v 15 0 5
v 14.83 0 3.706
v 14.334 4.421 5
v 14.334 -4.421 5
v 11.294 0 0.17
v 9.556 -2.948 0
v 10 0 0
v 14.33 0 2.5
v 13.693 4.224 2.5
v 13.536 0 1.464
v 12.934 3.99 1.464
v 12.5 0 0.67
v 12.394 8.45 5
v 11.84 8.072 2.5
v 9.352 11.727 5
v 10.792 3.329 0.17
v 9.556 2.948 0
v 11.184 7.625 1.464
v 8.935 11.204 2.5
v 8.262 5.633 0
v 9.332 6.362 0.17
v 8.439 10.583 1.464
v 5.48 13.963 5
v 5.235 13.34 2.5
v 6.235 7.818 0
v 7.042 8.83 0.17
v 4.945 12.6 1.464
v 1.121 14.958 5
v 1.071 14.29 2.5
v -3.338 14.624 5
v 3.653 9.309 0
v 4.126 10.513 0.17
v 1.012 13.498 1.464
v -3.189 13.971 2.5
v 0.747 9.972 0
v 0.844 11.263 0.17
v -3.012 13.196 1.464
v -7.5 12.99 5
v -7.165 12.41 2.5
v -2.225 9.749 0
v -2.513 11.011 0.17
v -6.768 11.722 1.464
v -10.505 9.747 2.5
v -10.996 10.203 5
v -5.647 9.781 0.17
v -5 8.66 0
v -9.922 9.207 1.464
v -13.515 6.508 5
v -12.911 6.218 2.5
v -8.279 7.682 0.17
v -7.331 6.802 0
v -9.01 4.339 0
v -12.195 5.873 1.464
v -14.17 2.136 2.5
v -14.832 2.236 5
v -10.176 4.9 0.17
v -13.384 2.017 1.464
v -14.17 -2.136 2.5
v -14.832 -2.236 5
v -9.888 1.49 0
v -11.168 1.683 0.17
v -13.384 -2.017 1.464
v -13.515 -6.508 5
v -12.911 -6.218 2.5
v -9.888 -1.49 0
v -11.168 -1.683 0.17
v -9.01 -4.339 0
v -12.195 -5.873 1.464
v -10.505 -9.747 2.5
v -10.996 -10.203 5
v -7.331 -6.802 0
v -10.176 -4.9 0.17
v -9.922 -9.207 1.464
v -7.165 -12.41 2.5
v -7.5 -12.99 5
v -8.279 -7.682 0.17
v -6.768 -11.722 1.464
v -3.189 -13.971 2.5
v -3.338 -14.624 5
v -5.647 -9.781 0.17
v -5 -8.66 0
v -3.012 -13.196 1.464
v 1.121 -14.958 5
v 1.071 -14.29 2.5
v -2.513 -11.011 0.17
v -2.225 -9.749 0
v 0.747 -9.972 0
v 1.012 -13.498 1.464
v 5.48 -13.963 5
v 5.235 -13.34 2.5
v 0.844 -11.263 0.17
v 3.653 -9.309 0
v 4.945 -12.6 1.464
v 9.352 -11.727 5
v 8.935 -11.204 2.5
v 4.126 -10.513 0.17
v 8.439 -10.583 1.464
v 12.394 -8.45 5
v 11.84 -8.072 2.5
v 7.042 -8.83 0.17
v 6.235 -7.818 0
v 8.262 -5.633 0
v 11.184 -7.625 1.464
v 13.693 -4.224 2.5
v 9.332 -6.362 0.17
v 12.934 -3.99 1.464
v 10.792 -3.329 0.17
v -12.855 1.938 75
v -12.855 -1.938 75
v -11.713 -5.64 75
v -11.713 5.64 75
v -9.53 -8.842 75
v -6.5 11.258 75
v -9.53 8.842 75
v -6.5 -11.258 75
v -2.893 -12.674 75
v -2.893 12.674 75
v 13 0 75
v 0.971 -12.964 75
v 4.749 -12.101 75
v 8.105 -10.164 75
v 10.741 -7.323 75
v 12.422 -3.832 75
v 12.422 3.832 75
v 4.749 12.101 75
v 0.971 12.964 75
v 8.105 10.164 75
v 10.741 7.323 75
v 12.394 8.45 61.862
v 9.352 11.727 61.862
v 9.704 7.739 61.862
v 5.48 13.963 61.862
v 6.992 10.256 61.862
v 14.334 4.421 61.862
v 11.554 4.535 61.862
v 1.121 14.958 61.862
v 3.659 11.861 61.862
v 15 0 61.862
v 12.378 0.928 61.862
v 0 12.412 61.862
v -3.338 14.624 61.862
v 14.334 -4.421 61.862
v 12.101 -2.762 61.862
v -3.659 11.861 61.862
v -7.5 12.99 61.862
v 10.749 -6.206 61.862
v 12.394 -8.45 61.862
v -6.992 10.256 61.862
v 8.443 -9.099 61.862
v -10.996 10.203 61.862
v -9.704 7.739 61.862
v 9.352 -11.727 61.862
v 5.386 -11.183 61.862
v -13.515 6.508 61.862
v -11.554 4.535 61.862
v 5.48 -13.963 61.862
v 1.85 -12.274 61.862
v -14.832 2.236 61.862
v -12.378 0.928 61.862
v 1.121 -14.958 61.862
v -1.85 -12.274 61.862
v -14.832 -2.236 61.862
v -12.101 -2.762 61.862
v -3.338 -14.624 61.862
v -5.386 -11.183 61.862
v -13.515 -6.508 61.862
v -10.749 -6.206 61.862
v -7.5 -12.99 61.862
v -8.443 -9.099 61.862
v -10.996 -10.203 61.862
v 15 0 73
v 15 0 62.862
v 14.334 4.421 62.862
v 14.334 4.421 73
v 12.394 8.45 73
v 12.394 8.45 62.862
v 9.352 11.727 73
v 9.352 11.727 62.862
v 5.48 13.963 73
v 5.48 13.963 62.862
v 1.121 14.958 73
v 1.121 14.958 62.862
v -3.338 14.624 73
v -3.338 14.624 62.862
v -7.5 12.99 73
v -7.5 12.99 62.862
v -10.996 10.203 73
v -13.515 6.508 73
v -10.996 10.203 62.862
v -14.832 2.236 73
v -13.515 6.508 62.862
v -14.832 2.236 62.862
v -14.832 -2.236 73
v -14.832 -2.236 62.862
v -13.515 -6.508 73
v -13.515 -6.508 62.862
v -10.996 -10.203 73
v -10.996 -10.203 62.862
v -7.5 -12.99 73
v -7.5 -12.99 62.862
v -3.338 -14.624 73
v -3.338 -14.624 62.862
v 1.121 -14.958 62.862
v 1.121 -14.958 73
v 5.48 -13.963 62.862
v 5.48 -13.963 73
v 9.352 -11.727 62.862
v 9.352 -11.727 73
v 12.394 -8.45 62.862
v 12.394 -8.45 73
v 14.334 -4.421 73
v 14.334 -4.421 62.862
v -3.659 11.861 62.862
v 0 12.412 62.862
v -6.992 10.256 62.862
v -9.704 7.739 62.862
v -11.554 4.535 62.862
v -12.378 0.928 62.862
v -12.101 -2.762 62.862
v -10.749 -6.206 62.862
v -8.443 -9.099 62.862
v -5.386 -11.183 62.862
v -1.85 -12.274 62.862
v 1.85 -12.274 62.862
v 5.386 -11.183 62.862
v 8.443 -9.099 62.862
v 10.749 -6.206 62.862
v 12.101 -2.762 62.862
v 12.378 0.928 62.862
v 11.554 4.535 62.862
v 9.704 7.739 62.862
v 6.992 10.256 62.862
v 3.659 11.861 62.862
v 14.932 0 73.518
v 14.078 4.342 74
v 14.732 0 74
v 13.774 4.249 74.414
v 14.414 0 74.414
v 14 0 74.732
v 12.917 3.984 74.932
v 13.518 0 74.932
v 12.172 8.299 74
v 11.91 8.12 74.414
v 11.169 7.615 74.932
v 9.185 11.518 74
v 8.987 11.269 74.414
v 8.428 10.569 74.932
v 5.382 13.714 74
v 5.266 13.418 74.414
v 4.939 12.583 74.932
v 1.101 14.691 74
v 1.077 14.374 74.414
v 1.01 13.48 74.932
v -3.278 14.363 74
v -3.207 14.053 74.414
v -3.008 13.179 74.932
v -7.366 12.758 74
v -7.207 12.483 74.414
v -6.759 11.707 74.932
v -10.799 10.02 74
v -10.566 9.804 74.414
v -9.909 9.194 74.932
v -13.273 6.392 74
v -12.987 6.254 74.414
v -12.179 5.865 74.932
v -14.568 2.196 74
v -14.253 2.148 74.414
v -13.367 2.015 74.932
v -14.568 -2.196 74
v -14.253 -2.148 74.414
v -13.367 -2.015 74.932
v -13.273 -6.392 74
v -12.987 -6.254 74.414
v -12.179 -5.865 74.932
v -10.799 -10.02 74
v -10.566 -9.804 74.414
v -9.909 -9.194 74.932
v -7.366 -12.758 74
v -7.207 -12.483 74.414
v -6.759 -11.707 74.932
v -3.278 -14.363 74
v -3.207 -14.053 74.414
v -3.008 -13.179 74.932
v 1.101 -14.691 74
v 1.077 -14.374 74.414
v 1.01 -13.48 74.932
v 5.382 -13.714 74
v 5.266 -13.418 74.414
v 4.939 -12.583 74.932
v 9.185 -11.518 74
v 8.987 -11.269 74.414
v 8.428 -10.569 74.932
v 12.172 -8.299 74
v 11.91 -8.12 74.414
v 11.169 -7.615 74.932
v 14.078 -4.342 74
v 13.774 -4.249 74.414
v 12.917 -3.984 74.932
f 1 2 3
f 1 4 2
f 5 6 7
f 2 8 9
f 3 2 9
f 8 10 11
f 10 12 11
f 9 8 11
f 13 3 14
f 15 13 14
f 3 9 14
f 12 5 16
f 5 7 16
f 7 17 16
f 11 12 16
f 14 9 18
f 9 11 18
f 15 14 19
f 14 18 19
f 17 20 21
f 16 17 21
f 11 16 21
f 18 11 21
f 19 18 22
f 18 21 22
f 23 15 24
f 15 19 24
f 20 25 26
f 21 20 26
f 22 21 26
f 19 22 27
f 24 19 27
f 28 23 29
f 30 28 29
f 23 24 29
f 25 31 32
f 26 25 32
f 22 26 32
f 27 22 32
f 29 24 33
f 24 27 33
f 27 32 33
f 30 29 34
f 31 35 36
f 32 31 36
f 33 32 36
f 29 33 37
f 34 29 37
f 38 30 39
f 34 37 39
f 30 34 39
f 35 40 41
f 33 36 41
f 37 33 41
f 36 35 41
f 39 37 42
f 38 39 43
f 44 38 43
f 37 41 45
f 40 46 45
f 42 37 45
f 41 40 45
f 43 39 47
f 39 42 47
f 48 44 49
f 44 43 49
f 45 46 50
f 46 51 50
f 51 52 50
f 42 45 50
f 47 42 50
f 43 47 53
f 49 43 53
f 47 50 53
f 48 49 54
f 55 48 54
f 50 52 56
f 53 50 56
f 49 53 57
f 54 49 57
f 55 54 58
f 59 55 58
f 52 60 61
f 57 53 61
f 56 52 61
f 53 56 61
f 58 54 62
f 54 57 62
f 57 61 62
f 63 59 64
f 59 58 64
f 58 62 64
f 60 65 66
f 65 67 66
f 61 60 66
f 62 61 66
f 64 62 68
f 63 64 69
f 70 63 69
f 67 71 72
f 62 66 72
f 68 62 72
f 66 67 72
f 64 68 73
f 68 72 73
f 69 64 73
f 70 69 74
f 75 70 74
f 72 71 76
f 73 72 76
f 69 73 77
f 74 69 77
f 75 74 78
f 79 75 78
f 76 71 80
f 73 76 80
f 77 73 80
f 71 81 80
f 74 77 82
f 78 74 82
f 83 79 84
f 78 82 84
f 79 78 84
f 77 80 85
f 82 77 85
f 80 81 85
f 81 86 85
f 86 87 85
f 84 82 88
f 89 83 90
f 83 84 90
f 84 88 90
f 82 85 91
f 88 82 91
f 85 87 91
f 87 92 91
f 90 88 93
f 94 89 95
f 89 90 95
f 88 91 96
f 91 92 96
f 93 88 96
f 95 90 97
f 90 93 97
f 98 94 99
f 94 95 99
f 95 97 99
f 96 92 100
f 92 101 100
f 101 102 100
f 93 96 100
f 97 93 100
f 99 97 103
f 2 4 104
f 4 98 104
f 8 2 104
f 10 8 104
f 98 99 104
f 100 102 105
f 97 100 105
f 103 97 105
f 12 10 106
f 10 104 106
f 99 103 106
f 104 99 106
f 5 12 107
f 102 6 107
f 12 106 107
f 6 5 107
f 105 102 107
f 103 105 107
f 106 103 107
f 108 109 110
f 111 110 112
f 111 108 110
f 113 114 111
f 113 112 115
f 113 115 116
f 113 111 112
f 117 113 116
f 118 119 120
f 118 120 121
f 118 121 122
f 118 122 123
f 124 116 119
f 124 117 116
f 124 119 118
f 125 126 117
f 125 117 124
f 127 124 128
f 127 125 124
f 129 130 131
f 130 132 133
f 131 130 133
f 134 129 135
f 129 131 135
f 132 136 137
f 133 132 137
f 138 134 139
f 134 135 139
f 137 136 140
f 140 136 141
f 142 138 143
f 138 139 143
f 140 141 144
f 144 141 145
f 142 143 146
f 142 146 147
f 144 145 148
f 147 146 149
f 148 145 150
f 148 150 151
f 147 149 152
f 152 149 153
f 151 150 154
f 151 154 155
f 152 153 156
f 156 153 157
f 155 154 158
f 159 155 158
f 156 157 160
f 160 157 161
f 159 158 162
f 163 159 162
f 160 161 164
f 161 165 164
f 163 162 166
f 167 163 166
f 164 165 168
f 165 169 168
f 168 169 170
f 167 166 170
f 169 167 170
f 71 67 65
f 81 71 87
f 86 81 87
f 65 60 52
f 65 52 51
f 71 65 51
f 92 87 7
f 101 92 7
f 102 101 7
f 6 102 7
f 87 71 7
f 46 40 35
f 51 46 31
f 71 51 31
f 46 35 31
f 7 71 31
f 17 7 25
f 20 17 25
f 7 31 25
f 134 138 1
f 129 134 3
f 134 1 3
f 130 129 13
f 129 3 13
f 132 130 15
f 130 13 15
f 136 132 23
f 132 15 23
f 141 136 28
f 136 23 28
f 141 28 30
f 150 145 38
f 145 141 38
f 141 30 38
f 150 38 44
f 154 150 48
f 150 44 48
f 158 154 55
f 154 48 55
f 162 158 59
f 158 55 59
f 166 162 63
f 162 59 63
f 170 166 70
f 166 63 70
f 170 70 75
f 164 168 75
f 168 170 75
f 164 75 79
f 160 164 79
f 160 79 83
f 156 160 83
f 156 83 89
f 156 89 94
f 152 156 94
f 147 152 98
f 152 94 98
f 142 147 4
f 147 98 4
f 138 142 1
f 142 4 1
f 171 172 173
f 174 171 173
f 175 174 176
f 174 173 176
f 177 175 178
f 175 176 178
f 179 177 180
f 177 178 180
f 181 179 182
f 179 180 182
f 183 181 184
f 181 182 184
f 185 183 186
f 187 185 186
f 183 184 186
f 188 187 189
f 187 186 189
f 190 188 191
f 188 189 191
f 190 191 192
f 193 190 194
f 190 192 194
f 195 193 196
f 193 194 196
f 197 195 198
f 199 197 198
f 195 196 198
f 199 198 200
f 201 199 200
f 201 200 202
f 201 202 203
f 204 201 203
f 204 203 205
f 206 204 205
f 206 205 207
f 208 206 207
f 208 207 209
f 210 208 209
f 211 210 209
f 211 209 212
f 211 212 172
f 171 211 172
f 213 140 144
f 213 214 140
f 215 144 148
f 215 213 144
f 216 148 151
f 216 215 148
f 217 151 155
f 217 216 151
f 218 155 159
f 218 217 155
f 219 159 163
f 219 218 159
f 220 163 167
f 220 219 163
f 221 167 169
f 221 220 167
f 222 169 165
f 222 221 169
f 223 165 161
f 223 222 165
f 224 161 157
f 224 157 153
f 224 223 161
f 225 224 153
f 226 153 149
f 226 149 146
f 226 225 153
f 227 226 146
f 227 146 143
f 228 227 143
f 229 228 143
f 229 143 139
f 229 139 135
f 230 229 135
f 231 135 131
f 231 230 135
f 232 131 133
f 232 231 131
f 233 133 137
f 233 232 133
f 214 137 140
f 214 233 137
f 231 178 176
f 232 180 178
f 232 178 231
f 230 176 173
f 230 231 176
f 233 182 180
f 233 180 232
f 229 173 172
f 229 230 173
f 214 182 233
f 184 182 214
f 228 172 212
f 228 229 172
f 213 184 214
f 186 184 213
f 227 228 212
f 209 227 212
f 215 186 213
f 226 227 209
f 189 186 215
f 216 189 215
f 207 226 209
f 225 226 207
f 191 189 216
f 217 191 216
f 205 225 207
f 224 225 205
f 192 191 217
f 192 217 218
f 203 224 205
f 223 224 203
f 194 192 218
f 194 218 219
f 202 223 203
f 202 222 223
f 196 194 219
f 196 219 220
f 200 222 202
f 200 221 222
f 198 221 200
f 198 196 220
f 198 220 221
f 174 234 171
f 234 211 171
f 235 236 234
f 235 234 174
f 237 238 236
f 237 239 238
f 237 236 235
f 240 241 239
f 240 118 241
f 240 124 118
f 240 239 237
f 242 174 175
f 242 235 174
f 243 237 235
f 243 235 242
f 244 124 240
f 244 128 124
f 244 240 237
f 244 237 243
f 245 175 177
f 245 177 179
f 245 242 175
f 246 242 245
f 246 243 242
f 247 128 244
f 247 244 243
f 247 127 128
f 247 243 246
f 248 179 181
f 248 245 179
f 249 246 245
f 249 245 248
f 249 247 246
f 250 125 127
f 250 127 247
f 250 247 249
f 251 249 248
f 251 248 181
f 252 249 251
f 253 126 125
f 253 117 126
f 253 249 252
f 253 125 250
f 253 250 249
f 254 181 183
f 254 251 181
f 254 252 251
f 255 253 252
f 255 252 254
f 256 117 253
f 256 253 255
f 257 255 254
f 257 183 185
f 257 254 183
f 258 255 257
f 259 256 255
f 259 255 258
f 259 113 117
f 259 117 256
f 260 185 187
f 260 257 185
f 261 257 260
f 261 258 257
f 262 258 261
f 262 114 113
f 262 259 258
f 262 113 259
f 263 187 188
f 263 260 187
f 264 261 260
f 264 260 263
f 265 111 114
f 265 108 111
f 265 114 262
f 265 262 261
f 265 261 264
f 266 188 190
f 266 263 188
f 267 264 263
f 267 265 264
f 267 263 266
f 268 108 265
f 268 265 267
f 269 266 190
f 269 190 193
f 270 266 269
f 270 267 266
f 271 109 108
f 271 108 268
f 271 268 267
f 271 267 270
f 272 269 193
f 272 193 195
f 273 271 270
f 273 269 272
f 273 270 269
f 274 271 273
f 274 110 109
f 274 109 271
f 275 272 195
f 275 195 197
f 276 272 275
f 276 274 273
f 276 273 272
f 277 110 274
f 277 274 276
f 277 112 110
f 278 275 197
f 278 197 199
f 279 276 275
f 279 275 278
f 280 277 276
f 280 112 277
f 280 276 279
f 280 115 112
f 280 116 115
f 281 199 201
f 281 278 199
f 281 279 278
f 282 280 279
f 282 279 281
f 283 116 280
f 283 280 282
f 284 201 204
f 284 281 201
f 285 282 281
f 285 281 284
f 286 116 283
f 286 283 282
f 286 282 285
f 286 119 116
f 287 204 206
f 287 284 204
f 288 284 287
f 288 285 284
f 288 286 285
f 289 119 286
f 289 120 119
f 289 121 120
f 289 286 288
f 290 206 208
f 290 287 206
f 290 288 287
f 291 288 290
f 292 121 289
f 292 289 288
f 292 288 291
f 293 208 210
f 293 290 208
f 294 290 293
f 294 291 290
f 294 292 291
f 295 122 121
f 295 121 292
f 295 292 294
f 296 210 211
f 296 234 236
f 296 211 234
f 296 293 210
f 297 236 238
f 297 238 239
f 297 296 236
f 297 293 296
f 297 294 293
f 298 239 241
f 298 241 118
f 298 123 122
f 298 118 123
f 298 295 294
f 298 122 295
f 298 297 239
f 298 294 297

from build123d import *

# Parameters (mm, degrees)
F0_R     = 15
F1_DEPTH = 75
F2_R     = 5
F3_R     = 2
F4_W     = 6.931401
F4_H     = 1


with BuildPart() as f1:
    # F0 (on Top) → F1 (new body)
    with BuildSketch(Plane.XY):
        Circle(F0_R)
    extrude(amount=F1_DEPTH)

    # F2
    f2_edges = [f1.edges().sort_by_distance(p)[0] for p in [
        (-15, 0, 0),
    ]]
    fillet(f2_edges, radius=F2_R)

    # F3
    f3_edges = [f1.edges().sort_by_distance(p)[0] for p in [
        (-15, 0, 75),
    ]]
    fillet(f3_edges, radius=F3_R)

    # F4 (on Right) → F5 (revolve, cut)
    with BuildSketch(Plane.YZ):
        with Locations((15.878135, 62.361921)):
            Rectangle(F4_W, F4_H)
    revolve(axis=Axis((0, 0, 55.164355), (0, 0, 1)), mode=Mode.SUBTRACT)


solid = f1.part
